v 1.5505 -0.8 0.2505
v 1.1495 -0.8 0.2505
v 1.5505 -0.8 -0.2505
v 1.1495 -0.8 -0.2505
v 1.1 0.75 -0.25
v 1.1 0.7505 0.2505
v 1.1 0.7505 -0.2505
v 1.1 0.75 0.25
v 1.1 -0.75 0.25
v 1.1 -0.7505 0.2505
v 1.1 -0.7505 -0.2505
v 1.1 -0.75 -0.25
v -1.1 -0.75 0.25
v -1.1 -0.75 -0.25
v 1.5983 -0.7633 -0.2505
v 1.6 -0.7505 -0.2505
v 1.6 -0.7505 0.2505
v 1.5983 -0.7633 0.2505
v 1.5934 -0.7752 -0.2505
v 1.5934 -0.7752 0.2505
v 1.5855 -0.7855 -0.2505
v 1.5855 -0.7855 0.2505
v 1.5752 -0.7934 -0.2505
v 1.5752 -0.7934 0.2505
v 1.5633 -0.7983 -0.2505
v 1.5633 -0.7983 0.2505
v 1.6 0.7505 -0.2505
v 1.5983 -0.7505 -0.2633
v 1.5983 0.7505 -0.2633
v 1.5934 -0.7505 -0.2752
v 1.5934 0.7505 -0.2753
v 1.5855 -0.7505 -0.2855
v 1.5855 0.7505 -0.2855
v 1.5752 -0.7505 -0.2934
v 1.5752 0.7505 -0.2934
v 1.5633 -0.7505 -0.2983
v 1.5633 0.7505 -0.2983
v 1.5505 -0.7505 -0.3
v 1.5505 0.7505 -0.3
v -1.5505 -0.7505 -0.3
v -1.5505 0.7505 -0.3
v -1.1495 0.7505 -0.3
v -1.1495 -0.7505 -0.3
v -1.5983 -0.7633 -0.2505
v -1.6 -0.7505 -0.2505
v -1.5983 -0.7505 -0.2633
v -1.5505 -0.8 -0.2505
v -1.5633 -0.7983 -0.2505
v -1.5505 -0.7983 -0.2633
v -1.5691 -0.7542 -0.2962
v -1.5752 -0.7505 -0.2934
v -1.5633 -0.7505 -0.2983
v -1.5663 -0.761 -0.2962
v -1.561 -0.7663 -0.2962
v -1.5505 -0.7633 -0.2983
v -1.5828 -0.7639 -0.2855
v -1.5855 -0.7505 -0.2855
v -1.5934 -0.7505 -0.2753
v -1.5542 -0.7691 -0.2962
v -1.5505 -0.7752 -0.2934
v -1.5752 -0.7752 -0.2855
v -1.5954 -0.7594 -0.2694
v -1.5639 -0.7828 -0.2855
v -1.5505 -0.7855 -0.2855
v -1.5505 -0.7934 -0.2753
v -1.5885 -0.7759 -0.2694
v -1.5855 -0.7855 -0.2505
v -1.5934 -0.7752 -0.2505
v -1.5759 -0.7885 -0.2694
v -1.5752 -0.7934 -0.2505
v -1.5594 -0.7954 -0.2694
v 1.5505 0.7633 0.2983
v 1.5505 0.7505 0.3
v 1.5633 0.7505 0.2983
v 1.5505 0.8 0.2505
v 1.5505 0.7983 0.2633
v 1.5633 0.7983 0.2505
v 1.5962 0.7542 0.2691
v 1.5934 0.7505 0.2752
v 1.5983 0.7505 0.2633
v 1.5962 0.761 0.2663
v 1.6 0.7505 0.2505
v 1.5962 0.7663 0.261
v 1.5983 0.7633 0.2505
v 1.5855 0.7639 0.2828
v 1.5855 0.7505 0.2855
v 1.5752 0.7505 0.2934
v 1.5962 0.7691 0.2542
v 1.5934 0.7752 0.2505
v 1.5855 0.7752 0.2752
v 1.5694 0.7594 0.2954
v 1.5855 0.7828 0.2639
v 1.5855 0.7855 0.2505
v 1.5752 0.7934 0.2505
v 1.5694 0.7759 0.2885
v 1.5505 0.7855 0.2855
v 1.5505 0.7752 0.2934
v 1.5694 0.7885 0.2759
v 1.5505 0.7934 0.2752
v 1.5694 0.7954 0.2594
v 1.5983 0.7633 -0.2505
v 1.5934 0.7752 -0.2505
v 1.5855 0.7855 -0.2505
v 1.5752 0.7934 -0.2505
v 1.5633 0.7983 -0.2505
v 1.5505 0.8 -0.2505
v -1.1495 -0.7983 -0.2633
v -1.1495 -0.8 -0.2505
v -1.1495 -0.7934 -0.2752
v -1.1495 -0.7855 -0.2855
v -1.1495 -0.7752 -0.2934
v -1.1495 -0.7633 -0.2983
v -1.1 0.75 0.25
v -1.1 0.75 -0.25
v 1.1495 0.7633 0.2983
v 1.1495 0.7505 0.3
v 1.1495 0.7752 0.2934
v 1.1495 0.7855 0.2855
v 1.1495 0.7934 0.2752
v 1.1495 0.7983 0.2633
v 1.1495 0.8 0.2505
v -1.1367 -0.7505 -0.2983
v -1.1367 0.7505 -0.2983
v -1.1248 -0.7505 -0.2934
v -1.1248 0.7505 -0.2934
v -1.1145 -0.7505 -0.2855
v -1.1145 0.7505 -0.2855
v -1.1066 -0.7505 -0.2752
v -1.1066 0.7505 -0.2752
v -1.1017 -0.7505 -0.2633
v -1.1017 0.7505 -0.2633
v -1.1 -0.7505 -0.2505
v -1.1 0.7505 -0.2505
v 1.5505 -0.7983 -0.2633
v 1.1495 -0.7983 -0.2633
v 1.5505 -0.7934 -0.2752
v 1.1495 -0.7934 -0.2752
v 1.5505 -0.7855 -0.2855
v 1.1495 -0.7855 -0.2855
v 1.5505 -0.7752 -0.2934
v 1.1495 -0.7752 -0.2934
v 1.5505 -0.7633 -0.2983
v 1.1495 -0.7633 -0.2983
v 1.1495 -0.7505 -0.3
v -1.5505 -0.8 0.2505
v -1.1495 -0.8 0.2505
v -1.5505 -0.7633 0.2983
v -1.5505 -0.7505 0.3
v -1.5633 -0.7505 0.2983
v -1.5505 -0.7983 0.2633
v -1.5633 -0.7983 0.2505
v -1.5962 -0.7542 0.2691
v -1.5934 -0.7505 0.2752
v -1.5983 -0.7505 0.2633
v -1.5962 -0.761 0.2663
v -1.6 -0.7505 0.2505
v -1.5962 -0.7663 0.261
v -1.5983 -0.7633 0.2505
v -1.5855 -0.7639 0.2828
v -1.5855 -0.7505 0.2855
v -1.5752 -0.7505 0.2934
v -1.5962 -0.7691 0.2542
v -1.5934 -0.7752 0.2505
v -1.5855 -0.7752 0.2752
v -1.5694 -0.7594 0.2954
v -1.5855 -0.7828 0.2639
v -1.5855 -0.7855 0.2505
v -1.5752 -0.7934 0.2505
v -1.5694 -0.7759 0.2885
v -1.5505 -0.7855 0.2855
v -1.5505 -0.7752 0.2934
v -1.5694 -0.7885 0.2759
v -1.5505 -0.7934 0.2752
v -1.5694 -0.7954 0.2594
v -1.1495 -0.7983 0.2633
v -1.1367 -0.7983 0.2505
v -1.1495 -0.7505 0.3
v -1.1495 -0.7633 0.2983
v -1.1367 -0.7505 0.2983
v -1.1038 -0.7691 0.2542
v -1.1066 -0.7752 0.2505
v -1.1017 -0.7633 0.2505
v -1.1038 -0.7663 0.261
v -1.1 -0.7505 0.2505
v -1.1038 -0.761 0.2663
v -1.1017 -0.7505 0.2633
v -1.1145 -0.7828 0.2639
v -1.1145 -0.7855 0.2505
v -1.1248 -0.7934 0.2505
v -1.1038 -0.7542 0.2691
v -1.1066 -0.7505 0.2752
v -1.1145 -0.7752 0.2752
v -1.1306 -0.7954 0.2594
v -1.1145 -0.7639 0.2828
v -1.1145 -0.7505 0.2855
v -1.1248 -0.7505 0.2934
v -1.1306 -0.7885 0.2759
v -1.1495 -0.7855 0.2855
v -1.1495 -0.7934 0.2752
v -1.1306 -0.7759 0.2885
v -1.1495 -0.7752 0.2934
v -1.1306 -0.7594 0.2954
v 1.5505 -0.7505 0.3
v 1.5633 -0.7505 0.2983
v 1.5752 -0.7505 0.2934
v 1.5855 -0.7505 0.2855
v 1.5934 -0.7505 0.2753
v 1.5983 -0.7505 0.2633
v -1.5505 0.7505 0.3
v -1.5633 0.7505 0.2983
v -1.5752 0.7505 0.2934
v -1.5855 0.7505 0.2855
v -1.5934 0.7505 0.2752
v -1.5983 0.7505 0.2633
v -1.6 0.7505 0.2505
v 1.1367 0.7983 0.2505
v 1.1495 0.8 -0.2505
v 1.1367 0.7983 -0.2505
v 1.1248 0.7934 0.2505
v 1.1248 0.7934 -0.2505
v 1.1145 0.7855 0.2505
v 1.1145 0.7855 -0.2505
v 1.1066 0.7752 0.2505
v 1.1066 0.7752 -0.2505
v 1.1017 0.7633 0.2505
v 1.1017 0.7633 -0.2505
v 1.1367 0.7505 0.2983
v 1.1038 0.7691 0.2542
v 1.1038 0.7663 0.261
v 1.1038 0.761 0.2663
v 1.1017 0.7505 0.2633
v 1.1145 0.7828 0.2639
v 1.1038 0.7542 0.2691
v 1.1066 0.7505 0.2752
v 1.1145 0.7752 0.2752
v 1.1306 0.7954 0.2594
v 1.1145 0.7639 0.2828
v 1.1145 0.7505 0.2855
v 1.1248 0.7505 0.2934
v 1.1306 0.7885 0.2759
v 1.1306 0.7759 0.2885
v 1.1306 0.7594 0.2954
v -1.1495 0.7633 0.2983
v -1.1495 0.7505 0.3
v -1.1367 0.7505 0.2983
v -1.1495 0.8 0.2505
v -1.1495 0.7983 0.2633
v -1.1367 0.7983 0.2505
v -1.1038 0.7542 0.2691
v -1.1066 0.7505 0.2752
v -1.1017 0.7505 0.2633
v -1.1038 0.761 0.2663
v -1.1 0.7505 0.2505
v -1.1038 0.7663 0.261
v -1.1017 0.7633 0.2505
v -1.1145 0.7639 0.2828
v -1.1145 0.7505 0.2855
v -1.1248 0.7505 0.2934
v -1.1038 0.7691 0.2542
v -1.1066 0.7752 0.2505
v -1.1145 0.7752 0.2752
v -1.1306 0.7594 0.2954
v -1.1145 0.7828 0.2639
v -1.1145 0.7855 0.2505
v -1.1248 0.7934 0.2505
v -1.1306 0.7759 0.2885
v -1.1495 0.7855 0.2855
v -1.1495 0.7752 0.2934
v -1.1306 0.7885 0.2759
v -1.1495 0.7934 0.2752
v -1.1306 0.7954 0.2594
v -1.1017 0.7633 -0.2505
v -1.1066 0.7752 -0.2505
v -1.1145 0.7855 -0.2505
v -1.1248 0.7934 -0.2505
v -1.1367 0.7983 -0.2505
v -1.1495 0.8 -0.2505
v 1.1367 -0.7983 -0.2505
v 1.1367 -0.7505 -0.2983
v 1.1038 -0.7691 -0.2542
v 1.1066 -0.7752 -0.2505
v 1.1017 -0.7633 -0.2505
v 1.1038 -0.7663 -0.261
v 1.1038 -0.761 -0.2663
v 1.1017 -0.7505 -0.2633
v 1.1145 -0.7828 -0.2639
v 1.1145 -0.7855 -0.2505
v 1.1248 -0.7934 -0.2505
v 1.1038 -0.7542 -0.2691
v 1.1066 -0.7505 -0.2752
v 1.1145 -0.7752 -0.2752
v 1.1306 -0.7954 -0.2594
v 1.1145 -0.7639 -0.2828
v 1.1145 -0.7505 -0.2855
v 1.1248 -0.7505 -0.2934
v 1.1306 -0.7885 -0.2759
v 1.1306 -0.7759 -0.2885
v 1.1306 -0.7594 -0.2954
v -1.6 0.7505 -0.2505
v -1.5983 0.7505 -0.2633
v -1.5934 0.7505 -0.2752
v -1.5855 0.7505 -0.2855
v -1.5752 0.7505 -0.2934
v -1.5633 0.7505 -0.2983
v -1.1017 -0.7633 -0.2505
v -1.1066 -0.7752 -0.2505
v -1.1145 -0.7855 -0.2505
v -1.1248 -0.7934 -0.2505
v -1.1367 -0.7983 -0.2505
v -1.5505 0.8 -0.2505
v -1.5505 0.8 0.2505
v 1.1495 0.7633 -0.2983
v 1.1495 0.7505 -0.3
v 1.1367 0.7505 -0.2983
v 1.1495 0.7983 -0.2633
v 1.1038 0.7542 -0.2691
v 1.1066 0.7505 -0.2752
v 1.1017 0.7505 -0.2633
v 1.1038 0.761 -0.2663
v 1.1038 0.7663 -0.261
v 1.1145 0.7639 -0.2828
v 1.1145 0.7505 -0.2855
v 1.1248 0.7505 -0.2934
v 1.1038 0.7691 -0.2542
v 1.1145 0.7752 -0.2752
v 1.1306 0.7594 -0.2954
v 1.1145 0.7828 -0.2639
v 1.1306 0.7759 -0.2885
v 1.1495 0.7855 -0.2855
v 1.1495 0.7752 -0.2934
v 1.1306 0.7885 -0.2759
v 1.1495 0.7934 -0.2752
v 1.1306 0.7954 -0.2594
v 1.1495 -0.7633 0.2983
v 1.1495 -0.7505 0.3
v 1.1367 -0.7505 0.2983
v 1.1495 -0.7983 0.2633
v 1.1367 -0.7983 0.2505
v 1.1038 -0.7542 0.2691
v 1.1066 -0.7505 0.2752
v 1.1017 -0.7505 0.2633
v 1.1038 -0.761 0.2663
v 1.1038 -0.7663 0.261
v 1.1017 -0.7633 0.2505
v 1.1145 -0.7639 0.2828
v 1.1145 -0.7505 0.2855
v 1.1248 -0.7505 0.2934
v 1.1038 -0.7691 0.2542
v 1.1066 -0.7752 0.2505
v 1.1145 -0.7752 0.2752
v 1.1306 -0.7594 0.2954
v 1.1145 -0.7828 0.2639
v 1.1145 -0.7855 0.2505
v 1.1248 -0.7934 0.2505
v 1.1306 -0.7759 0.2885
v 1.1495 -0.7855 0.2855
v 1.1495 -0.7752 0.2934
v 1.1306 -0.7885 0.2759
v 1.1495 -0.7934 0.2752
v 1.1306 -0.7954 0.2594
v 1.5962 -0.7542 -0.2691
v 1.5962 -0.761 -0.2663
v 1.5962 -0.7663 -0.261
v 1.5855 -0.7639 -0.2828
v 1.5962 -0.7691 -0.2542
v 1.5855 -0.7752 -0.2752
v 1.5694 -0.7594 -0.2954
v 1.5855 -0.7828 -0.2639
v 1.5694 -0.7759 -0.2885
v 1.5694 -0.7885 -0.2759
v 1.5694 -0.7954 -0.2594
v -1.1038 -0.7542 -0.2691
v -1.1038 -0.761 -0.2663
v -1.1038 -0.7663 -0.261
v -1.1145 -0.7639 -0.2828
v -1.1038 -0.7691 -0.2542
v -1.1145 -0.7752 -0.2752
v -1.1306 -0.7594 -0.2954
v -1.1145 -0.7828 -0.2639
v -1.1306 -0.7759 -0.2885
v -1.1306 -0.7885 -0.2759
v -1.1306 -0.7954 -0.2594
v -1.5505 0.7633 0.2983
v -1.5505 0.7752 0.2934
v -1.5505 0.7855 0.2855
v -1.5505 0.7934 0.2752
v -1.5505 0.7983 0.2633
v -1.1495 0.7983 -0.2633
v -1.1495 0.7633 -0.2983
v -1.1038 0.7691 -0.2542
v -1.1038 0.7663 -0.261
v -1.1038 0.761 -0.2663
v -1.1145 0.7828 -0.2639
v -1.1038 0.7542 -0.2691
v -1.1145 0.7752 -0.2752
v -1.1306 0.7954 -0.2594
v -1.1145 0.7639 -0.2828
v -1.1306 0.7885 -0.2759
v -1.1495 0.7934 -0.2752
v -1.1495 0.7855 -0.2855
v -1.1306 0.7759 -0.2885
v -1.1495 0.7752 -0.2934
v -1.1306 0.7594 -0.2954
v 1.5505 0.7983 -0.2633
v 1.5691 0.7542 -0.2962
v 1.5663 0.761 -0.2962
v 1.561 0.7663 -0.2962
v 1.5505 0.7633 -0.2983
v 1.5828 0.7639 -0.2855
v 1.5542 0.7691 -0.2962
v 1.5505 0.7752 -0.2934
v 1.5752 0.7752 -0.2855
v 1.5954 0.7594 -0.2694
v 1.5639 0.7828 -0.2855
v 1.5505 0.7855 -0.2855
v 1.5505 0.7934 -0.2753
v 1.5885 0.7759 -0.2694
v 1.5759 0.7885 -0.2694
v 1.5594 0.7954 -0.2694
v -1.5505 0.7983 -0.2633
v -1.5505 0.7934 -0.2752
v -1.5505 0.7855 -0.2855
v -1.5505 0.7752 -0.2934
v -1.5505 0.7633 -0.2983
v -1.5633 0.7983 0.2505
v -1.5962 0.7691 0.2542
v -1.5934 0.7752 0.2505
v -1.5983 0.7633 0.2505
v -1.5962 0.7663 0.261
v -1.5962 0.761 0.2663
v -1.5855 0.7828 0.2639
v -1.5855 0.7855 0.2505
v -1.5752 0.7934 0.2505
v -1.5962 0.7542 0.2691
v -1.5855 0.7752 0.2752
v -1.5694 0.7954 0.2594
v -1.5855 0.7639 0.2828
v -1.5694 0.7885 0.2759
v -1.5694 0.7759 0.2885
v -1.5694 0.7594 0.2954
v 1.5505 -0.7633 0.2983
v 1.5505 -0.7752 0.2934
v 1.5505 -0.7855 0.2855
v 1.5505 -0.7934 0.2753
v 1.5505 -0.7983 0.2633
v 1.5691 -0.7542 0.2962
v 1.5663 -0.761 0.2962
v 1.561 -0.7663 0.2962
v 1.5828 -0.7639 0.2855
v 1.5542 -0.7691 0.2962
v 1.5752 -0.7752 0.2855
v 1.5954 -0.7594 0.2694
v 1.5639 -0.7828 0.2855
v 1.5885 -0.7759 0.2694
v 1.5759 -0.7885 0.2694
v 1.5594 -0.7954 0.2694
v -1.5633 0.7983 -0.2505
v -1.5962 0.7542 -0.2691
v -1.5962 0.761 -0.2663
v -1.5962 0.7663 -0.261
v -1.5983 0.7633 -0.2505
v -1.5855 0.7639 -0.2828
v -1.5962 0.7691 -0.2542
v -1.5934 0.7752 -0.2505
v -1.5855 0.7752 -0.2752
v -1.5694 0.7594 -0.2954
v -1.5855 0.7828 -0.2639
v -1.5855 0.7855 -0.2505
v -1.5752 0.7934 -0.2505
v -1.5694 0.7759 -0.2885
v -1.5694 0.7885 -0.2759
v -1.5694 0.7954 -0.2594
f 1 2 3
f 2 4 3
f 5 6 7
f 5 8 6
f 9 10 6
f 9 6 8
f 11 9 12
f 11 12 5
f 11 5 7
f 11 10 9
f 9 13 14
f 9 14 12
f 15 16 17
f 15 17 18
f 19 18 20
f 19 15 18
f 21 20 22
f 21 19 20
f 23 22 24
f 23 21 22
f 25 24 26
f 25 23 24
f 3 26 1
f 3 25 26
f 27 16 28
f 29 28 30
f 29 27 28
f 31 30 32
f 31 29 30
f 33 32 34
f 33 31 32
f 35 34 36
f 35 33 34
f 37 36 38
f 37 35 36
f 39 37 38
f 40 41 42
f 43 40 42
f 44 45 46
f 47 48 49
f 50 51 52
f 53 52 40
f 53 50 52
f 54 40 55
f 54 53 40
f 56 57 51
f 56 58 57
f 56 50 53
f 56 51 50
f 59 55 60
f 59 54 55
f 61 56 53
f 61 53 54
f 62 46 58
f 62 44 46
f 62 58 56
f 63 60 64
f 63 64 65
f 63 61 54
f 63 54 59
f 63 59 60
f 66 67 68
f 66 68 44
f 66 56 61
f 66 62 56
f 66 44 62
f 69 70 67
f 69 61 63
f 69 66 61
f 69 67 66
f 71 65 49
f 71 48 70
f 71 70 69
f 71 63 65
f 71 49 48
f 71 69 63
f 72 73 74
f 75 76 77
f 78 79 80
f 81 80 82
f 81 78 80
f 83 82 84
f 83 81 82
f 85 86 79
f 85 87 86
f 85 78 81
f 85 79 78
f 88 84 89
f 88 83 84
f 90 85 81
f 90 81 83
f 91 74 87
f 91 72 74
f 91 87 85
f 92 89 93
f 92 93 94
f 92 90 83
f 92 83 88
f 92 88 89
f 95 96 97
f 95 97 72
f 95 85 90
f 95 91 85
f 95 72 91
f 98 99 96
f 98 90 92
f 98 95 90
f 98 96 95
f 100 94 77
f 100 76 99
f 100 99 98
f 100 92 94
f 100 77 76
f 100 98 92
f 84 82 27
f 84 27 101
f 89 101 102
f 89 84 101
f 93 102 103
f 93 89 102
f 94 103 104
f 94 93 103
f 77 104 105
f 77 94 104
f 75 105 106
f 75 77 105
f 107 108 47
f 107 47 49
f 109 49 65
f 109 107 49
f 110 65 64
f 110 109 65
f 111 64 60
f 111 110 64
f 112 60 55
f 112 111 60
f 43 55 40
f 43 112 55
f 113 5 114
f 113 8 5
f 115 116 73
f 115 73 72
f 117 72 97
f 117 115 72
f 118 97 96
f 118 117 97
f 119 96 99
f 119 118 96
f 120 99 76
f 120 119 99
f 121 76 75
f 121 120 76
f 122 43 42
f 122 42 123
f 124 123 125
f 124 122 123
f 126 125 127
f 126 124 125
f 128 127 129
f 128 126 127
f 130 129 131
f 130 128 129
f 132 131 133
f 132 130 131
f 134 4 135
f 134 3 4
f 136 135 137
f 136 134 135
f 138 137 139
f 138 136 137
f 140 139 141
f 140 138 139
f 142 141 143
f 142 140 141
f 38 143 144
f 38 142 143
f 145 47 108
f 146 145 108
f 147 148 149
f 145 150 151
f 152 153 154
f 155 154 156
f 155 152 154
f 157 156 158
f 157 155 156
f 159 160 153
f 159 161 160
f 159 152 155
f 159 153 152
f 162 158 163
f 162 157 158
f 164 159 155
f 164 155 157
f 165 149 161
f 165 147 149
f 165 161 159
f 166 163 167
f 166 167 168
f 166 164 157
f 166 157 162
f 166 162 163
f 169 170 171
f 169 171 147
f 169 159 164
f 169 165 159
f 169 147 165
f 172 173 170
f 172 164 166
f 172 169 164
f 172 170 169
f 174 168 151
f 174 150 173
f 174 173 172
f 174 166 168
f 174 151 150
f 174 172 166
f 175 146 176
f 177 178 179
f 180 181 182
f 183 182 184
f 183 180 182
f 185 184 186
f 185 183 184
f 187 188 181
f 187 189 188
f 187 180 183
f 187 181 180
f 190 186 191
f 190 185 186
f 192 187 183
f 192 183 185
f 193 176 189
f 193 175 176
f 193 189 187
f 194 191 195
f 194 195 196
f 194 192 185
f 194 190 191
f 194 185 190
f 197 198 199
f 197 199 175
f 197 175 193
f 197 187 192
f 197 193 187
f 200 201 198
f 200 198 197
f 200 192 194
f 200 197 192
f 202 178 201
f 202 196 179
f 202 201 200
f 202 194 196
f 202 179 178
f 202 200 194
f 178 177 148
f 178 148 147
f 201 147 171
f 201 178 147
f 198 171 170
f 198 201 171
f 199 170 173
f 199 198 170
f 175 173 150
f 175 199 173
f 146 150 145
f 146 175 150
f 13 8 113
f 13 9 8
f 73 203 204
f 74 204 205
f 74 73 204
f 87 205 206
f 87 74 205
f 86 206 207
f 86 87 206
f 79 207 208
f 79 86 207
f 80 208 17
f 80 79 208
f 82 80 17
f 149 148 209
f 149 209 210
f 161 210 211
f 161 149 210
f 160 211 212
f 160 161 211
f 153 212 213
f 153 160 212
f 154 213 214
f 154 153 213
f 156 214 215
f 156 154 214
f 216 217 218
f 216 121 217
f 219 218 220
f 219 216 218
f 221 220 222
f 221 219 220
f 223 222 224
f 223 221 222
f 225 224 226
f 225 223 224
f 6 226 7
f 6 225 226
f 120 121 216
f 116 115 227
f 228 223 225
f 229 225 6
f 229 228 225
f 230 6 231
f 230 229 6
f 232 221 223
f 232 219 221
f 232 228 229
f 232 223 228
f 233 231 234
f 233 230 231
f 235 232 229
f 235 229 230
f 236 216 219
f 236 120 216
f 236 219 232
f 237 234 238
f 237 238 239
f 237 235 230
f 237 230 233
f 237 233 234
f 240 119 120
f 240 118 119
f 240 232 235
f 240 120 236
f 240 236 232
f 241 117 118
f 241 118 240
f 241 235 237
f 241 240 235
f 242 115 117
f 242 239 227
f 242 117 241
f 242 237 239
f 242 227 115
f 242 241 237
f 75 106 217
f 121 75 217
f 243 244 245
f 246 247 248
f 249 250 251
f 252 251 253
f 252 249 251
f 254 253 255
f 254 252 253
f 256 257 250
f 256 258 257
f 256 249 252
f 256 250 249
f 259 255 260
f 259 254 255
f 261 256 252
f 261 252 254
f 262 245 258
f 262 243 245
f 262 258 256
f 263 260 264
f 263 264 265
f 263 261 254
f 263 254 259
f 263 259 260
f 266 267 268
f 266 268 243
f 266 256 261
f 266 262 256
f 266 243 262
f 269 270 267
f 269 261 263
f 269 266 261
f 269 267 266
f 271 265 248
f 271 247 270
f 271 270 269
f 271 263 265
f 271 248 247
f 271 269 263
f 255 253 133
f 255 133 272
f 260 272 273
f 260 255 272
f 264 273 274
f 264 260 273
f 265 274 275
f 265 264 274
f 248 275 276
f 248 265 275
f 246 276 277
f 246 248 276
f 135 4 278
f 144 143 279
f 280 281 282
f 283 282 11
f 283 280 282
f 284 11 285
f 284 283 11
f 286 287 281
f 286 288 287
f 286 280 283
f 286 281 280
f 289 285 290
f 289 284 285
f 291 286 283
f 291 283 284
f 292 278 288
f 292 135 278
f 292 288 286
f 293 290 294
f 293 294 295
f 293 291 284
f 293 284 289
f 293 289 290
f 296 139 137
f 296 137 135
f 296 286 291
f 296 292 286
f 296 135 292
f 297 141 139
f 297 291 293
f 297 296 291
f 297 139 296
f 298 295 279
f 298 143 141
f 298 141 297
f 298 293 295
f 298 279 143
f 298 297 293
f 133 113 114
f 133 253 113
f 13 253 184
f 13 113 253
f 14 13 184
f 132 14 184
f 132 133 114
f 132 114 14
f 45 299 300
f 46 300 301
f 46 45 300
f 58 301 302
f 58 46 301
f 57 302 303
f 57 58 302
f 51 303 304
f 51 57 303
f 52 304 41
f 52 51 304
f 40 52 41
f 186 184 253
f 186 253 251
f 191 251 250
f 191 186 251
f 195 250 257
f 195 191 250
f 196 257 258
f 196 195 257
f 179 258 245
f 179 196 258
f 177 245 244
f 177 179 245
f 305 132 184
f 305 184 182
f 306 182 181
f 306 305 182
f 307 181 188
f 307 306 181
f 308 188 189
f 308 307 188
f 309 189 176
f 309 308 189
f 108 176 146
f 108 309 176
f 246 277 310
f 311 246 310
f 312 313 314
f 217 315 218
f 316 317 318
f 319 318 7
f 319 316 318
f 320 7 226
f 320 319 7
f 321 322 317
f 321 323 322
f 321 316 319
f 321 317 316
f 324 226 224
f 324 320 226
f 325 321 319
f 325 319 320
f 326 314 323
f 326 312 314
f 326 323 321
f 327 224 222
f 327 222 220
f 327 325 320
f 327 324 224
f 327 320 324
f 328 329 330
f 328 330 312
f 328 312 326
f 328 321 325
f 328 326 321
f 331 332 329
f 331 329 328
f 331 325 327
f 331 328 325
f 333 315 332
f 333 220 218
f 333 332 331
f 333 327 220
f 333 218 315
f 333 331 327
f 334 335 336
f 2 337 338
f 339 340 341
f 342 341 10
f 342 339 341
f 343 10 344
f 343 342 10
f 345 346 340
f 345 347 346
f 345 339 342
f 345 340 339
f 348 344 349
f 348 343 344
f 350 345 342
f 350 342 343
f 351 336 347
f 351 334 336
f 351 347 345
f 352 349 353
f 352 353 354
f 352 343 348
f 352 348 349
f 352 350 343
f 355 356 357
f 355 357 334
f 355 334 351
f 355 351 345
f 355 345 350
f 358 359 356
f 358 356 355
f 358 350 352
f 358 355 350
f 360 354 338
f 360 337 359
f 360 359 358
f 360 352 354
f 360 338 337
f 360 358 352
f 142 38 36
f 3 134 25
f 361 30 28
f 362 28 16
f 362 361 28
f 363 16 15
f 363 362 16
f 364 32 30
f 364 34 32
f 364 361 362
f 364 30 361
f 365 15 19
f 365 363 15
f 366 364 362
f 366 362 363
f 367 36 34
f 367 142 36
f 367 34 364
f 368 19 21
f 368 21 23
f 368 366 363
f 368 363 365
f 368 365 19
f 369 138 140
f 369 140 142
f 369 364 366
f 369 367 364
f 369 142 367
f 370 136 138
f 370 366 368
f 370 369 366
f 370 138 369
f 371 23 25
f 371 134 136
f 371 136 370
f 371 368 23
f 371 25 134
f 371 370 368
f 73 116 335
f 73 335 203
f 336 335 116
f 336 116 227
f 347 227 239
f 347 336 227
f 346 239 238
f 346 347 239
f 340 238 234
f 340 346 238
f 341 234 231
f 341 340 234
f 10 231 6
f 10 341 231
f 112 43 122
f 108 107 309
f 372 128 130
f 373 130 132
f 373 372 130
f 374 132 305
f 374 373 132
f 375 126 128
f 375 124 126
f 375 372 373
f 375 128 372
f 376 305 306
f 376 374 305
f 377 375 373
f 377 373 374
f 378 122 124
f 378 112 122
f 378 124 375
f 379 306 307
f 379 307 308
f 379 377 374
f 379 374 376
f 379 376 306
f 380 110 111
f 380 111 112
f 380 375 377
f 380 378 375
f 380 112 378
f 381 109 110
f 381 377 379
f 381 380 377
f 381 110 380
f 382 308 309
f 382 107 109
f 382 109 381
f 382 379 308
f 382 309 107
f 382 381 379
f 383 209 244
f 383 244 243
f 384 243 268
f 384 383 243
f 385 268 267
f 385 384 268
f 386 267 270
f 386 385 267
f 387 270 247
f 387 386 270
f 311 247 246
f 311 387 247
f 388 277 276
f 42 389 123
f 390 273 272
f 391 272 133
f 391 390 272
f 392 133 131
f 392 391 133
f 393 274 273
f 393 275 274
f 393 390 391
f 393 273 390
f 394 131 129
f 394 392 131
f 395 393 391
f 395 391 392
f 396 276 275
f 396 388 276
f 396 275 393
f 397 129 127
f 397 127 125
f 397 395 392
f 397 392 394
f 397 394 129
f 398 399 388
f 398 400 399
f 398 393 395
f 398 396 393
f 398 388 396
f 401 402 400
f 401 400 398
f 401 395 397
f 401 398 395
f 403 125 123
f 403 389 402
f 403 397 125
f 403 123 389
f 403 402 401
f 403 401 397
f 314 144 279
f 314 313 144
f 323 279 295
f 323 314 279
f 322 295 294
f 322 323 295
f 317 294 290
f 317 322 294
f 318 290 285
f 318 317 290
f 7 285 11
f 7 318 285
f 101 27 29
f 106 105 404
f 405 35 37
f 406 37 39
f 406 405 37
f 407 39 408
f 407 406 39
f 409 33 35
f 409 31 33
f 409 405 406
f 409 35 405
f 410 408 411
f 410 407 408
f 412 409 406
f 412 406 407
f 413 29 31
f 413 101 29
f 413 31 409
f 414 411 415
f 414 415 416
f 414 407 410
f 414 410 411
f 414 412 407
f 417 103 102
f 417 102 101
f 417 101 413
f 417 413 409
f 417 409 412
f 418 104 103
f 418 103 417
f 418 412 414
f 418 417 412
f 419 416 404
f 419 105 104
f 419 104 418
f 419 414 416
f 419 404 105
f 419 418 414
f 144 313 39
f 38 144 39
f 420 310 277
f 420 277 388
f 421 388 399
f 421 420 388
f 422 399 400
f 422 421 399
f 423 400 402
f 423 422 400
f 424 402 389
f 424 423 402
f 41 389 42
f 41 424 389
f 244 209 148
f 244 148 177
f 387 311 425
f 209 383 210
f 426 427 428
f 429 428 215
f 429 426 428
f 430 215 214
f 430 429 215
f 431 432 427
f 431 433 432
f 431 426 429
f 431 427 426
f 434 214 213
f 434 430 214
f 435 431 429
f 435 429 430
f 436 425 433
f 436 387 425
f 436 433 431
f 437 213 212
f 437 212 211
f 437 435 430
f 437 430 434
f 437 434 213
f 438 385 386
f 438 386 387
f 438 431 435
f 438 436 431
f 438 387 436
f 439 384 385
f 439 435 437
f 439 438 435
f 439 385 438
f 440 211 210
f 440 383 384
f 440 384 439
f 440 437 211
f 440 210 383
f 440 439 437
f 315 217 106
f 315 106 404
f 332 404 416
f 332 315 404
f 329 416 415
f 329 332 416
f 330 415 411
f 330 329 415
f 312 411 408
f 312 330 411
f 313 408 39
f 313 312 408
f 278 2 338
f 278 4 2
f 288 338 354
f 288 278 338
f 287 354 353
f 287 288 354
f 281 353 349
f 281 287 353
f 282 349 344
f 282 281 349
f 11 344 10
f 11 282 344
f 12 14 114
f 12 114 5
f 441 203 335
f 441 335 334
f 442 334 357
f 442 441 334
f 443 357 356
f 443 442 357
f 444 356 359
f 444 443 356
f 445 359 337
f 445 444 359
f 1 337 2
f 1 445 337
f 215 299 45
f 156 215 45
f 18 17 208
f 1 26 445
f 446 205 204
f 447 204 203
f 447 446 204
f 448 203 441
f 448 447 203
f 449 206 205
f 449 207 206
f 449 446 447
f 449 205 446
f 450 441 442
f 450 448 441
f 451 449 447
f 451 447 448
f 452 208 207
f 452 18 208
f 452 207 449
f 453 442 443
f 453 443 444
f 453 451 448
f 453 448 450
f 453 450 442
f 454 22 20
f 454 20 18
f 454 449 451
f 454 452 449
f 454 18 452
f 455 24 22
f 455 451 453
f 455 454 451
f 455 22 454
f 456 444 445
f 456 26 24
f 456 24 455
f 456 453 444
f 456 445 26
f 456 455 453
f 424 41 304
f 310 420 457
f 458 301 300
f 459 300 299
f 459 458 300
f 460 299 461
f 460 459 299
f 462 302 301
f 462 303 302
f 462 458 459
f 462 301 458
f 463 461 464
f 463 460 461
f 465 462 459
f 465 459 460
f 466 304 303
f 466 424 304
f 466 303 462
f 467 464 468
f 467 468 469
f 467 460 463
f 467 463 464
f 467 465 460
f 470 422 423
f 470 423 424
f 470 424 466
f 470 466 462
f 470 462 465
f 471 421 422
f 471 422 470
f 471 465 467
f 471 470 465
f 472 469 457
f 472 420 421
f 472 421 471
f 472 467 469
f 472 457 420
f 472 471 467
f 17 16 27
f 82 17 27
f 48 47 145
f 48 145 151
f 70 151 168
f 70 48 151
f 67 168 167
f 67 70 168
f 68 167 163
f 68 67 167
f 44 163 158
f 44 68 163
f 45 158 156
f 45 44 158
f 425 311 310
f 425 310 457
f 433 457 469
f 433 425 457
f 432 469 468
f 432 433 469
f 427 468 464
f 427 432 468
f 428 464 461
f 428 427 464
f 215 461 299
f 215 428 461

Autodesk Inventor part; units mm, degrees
ref_plane "YZ Plane" through (0, 0, 0) normal (1, 0, 0) x (0, 1, 0)
ref_plane "XZ Plane" through (0, 0, 0) normal (0, 1, 0) x (-1, 0, 0)
ref_plane "XY Plane" through (0, 0, 0) normal (0, 0, 1) x (1, 0, 0)
sketch "Sketch1" plane through (0, 0, 0) normal (0, 0, 1) x (1, 0, 0)
  line L0 (1.6, 0.8) -> (-1.6, 0.8)
  line L1 (-1.6, 0.8) -> (-1.6, -0.8)
  line L2 (-1.6, -0.8) -> (1.6, -0.8)
  line L3 (1.6, -0.8) -> (1.6, 0.8)
  line L4 (1.6, 0.8) -> (-1.6, -0.8) construction
  line L5 (-1.6, 0.8) -> (1.6, -0.8) construction
  point P0 (0, 0)
  point P1 (0, 0)
  point P2 (0, 0)
  dimension "d0" = 3.2
  dimension "d1" = 1.6
extrude "Extrusion1" add sketch "Sketch1" along normal mid plane 0.6
sketch "Sketch2" plane through (0, 0, 0.3) normal (0, 0, 1) x (-1, 0, 0)
  line L0 (1.1, 0.4493) -> (1.1, -0.8)
  line L1 (-1.1, 0.8) -> (-1.1, -0.45)
  line L2 (-1.1, 0.8) -> (1.1, 0.8)
  line L3 (1.1, 0.8) -> (1.1, -0.8)
  line L4 (1.1, -0.8) -> (-1.1, -0.8)
  line L5 (-1.1, -0.8) -> (-1.1, 0.8)
  line L6 (-1.6, -0.8) -> (1.6, -0.8) projected
  line L7 (1.6, 0.8) -> (-1.6, 0.8) projected
  line L8 (1.6, -0.8) -> (1.6, 0.8) projected
  line L9 (-1.6, 0.8) -> (-1.6, -0.8) projected
  point P0 (0, 0)
  dimension "d11" = 0.5
  dimension "d12" = 0.5
extrude "Extrusion2" cut sketch "Sketch2" against normal blind 0.05 contours L0 L4 L5 L1 L2 L3
mirror "Mirror1" about plane through (0, 0, 0) normal (0, 0, 1) of "Extrusion2"
sketch "Sketch3" plane through (1.6, -0.8, -0.3) normal (0, -1, 0) x (1, 0, 0)
  line L0 (-2.7, 0.55) -> (-0.5, 0.55)
  line L1 (-0.5, 0.55) -> (-0.5, 0.05)
  line L2 (-0.5, 0.05) -> (-2.7, 0.05)
  line L3 (-2.7, 0.05) -> (-2.7, 0.55)
  point P0 (-1.6, 0.3)
extrude "Extrusion3" cut sketch "Sketch3" against normal blind 0.05
mirror "Mirror2" about plane through (0, 0, 0) normal (0, 1, 0) of "Extrusion3"
fillet "Fillet1" radius 0.05 24 edges at (1.35, 0.8, 0.3) (1.6, 0.8, 0) (1.35, 0.8, -0.3) (1.35, -0.8, -0.3) (1.6, -0.8, 0) (1.35, -0.8, 0.3) (-1.35, -0.8, 0.3) (-1.6, -0.8, 0) (-1.35, -0.8, -0.3) (1.6, 0, -0.3) (1.6, 0, 0.3) (-1.35, 0.8, 0.3) (-1.6, 0, 0.3) (-1.35, 0.8, -0.3) (-1.6, 0.8, 0) (-1.6, 0, -0.3) (-1.1, 0.8, 0) (-1.1, 0, 0.3) (-1.1, -0.8, 0) (-1.1, 0, -0.3) (1.1, 0.8, 0) (1.1, 0, -0.3) (1.1, -0.8, 0) (1.1, 0, 0.3)
properties part number "C3216C0G2J221K060AA"
